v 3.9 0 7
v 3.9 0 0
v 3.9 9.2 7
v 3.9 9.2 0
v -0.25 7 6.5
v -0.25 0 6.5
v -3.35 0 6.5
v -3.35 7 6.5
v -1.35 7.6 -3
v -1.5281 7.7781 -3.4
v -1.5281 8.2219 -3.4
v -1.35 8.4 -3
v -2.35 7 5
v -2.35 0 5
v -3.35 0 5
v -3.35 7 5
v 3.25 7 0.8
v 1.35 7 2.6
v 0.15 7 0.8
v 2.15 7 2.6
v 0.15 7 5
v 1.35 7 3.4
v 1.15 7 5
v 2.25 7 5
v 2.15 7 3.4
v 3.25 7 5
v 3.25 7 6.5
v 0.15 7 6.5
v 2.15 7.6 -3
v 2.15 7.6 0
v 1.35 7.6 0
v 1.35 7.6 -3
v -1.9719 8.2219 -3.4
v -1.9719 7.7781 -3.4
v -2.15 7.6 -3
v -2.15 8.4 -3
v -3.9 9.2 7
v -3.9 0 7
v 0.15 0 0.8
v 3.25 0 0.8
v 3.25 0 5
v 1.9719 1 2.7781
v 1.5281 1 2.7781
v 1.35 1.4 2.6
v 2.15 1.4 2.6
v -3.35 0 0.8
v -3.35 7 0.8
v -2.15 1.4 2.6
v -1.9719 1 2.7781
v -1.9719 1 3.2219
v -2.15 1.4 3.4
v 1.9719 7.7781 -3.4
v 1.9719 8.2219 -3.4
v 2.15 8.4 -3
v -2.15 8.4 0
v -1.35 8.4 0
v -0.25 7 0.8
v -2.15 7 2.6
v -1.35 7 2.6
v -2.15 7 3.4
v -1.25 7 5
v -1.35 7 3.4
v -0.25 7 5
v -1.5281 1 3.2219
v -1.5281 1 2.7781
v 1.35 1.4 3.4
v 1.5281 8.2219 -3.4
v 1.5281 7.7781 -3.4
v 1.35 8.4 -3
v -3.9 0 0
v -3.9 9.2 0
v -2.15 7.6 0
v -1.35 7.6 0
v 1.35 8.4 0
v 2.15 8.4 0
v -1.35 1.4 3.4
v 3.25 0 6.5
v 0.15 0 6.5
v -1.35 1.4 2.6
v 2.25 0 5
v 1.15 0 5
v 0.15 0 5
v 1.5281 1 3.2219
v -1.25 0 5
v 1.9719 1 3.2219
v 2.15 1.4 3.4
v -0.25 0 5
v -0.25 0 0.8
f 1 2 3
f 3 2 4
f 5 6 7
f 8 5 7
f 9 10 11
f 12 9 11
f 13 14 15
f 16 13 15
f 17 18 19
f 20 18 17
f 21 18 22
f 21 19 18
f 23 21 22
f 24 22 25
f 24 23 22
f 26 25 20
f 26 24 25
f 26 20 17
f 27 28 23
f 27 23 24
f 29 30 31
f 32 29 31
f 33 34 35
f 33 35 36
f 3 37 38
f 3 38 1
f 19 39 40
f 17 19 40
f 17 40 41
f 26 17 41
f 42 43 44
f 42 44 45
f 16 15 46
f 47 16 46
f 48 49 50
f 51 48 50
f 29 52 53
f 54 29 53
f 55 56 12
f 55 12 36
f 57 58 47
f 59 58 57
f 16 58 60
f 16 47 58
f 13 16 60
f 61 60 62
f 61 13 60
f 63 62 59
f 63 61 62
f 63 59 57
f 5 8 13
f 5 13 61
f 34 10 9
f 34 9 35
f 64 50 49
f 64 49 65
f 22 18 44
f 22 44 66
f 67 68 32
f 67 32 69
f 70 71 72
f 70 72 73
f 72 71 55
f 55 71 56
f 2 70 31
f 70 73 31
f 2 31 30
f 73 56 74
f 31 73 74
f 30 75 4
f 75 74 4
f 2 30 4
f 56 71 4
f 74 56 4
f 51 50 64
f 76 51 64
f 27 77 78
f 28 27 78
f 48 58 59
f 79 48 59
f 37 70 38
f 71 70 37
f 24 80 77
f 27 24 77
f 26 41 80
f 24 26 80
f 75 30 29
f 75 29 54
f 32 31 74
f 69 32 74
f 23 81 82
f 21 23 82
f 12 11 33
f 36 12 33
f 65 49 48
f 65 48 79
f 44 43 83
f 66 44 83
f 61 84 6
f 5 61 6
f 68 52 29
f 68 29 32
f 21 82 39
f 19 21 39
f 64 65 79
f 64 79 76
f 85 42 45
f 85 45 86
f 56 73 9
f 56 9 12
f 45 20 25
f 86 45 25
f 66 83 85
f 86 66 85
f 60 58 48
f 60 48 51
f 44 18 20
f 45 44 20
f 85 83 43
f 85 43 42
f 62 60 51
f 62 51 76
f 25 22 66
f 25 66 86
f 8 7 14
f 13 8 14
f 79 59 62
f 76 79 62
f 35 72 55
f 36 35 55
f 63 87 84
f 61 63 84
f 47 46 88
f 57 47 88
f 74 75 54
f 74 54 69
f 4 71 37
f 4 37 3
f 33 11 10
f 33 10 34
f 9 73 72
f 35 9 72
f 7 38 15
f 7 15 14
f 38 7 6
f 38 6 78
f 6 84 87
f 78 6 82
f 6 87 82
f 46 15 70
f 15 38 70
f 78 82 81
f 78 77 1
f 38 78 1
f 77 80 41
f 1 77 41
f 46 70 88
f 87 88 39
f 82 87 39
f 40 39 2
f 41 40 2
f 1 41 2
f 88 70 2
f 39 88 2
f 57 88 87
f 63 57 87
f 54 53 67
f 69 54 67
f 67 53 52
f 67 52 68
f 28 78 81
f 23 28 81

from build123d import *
from OCP.BRepFilletAPI import BRepFilletAPI_MakeChamfer

# Parameters (mm, degrees)
SKETCH_1_W                          = 7.8
SKETCH_1_H                          = 9.2
EXTRUDE_1_DEPTH                     = 7
SKETCH_2_W                          = 0.8
SKETCH_2_H                          = 0.8
EXTRUDE_2_DEPTH                     = 3.4
CHAMFER_1_SIZE                      = 0.4
CHAMFER_1_SIZE2                     = 0.178091474
CUT_EXTRUDE_1_DEPTH                 = 7
PATTERN_LINEAR_1_COUNT              = 3
PATTERN_LINEAR_1_PITCH              = 3.5
CHAMFER_1_OF_PATTERN_LINEAR_1_SIZE  = 0.4
CHAMFER_1_OF_PATTERN_LINEAR_1_SIZE2 = 0.178091474
PATTERN_LINEAR_2_COUNT              = 2
PATTERN_LINEAR_2_PITCH              = 3.5
SKETCH_4_W                          = 0.8
SKETCH_4_H                          = 0.8
EXTRUDE_3_DEPTH                     = 6
CHAMFER_2_SIZE                      = 0.4
CHAMFER_2_SIZE2                     = 0.178091474
PATTERN_LINEAR_3_COUNT              = 2
PATTERN_LINEAR_3_PITCH              = 3.5
CHAMFER_2_OF_PATTERN_LINEAR_3_SIZE  = 0.4
CHAMFER_2_OF_PATTERN_LINEAR_3_SIZE2 = 0.178091474


with BuildPart() as part:
    # Эскиз1 → Бобышка-Вытянуть1 (new body)
    with BuildSketch(Plane.XY):
        with Locations((0, 4.6)):
            Rectangle(SKETCH_1_W, SKETCH_1_H)
    extrude(amount=EXTRUDE_1_DEPTH)

    # Эскиз2 → Бобышка-Вытянуть2 (add)
    with BuildSketch(Plane(origin=(0, 0, 0), x_dir=(-1, 0, 0), z_dir=(0, 0, -1))):
        with Locations((-1.75, 8)):
            Rectangle(SKETCH_2_W, SKETCH_2_H)
    extrude_2 = extrude(amount=EXTRUDE_2_DEPTH)

    # Фаска1: one chamfer whose edges measure the first distance from different faces: ONE call of the kernel's chamfer builder (chamfer() names one face for all edges)
    chamfer_1_edges_1 = [part.edges().sort_by_distance(p)[0] for p in [
        (1.35, 8, -3.4),
    ]]
    chamfer_1_side_1 = [part.faces().sort_by_distance(p)[0] for p in [
        (1.35, 8, -1.7),
    ]]
    chamfer_1_edges_2 = [part.edges().sort_by_distance(p)[0] for p in [
        (1.75, 8.4, -3.4),
    ]]
    chamfer_1_side_2 = [part.faces().sort_by_distance(p)[0] for p in [
        (1.75, 8.4, -1.7),
    ]]
    chamfer_1_edges_3 = [part.edges().sort_by_distance(p)[0] for p in [
        (2.15, 8, -3.4),
    ]]
    chamfer_1_side_3 = [part.faces().sort_by_distance(p)[0] for p in [
        (2.15, 8, -1.7),
    ]]
    chamfer_1_edges_4 = [part.edges().sort_by_distance(p)[0] for p in [
        (1.75, 7.6, -3.4),
    ]]
    chamfer_1_side_4 = [part.faces().sort_by_distance(p)[0] for p in [
        (1.75, 7.6, -1.7),
    ]]
    chamfer_1 = BRepFilletAPI_MakeChamfer(part.part.solid().wrapped)
    for e in chamfer_1_edges_1:
        chamfer_1.Add(CHAMFER_1_SIZE, CHAMFER_1_SIZE2, e.wrapped, chamfer_1_side_1[0].wrapped)  # the first distance lies on this face
    for e in chamfer_1_edges_2:
        chamfer_1.Add(CHAMFER_1_SIZE, CHAMFER_1_SIZE2, e.wrapped, chamfer_1_side_2[0].wrapped)  # the first distance lies on this face
    for e in chamfer_1_edges_3:
        chamfer_1.Add(CHAMFER_1_SIZE, CHAMFER_1_SIZE2, e.wrapped, chamfer_1_side_3[0].wrapped)  # the first distance lies on this face
    for e in chamfer_1_edges_4:
        chamfer_1.Add(CHAMFER_1_SIZE, CHAMFER_1_SIZE2, e.wrapped, chamfer_1_side_4[0].wrapped)  # the first distance lies on this face
    add(Compound.cast(chamfer_1.Shape()), mode=Mode.REPLACE)

    # Эскиз3 → Вырез-Вытянуть1 (cut)
    with BuildSketch(Plane.XZ):
        Polygon((0.15, 0.8), (3.25, 0.8), (3.25, 5), (2.25, 5), (3.25, 6.5), (0.15, 6.5), (1.15, 5), (0.15, 5), align=None)
    cut_extrude_1 = extrude(amount=-CUT_EXTRUDE_1_DEPTH, mode=Mode.SUBTRACT)

    # Линейный массив1: Бобышка-Вытянуть2 ×3, 1 skipped
    with Locations(*[(-i * PATTERN_LINEAR_1_PITCH, 0, 0) for i in range(1, PATTERN_LINEAR_1_COUNT) if i not in (2,)]):
        add(extrude_2)

    # Фаска1 of Линейный массив1: one chamfer whose edges measure the first distance from different faces: ONE call of the kernel's chamfer builder (chamfer() names one face for all edges)
    chamfer_1_of_pattern_linear_1_edges_1 = [part.edges().sort_by_distance(p)[0] for p in [
        (-2.15, 8, -3.4),
    ]]
    chamfer_1_of_pattern_linear_1_side_1 = [part.faces().sort_by_distance(p)[0] for p in [
        (-2.15, 8, -1.7),
    ]]
    chamfer_1_of_pattern_linear_1_edges_2 = [part.edges().sort_by_distance(p)[0] for p in [
        (-1.75, 8.4, -3.4),
    ]]
    chamfer_1_of_pattern_linear_1_side_2 = [part.faces().sort_by_distance(p)[0] for p in [
        (-1.75, 8.4, -1.7),
    ]]
    chamfer_1_of_pattern_linear_1_edges_3 = [part.edges().sort_by_distance(p)[0] for p in [
        (-1.35, 8, -3.4),
    ]]
    chamfer_1_of_pattern_linear_1_side_3 = [part.faces().sort_by_distance(p)[0] for p in [
        (-1.35, 8, -1.7),
    ]]
    chamfer_1_of_pattern_linear_1_edges_4 = [part.edges().sort_by_distance(p)[0] for p in [
        (-1.75, 7.6, -3.4),
    ]]
    chamfer_1_of_pattern_linear_1_side_4 = [part.faces().sort_by_distance(p)[0] for p in [
        (-1.75, 7.6, -1.7),
    ]]
    chamfer_1_of_pattern_linear_1 = BRepFilletAPI_MakeChamfer(part.part.solid().wrapped)
    for e in chamfer_1_of_pattern_linear_1_edges_1:
        chamfer_1_of_pattern_linear_1.Add(CHAMFER_1_OF_PATTERN_LINEAR_1_SIZE, CHAMFER_1_OF_PATTERN_LINEAR_1_SIZE2, e.wrapped, chamfer_1_of_pattern_linear_1_side_1[0].wrapped)  # the first distance lies on this face
    for e in chamfer_1_of_pattern_linear_1_edges_2:
        chamfer_1_of_pattern_linear_1.Add(CHAMFER_1_OF_PATTERN_LINEAR_1_SIZE, CHAMFER_1_OF_PATTERN_LINEAR_1_SIZE2, e.wrapped, chamfer_1_of_pattern_linear_1_side_2[0].wrapped)  # the first distance lies on this face
    for e in chamfer_1_of_pattern_linear_1_edges_3:
        chamfer_1_of_pattern_linear_1.Add(CHAMFER_1_OF_PATTERN_LINEAR_1_SIZE, CHAMFER_1_OF_PATTERN_LINEAR_1_SIZE2, e.wrapped, chamfer_1_of_pattern_linear_1_side_3[0].wrapped)  # the first distance lies on this face
    for e in chamfer_1_of_pattern_linear_1_edges_4:
        chamfer_1_of_pattern_linear_1.Add(CHAMFER_1_OF_PATTERN_LINEAR_1_SIZE, CHAMFER_1_OF_PATTERN_LINEAR_1_SIZE2, e.wrapped, chamfer_1_of_pattern_linear_1_side_4[0].wrapped)  # the first distance lies on this face
    add(Compound.cast(chamfer_1_of_pattern_linear_1.Shape()), mode=Mode.REPLACE)

    # Линейный массив2: Вырез-Вытянуть1 ×2
    with Locations(*[(-i * PATTERN_LINEAR_2_PITCH, 0, 0) for i in range(1, PATTERN_LINEAR_2_COUNT)]):
        add(cut_extrude_1, mode=Mode.SUBTRACT)

    # Эскиз4 → Бобышка-Вытянуть3 (add)
    with BuildSketch(Plane.XZ.offset(-7)):
        with Locations((1.75, 3)):
            Rectangle(SKETCH_4_W, SKETCH_4_H)
    extrude_3 = extrude(amount=EXTRUDE_3_DEPTH)

    # Фаска2: one chamfer whose edges measure the first distance from different faces: ONE call of the kernel's chamfer builder (chamfer() names one face for all edges)
    chamfer_2_edges_1 = [part.edges().sort_by_distance(p)[0] for p in [
        (2.15, 1, 3),
    ]]
    chamfer_2_side_1 = [part.faces().sort_by_distance(p)[0] for p in [
        (2.15, 4, 3),
    ]]
    chamfer_2_edges_2 = [part.edges().sort_by_distance(p)[0] for p in [
        (1.75, 1, 3.4),
    ]]
    chamfer_2_side_2 = [part.faces().sort_by_distance(p)[0] for p in [
        (1.75, 4, 3.4),
    ]]
    chamfer_2_edges_3 = [part.edges().sort_by_distance(p)[0] for p in [
        (1.35, 1, 3),
    ]]
    chamfer_2_side_3 = [part.faces().sort_by_distance(p)[0] for p in [
        (1.35, 4, 3),
    ]]
    chamfer_2_edges_4 = [part.edges().sort_by_distance(p)[0] for p in [
        (1.75, 1, 2.6),
    ]]
    chamfer_2_side_4 = [part.faces().sort_by_distance(p)[0] for p in [
        (1.75, 4, 2.6),
    ]]
    chamfer_2 = BRepFilletAPI_MakeChamfer(part.part.solid().wrapped)
    for e in chamfer_2_edges_1:
        chamfer_2.Add(CHAMFER_2_SIZE, CHAMFER_2_SIZE2, e.wrapped, chamfer_2_side_1[0].wrapped)  # the first distance lies on this face
    for e in chamfer_2_edges_2:
        chamfer_2.Add(CHAMFER_2_SIZE, CHAMFER_2_SIZE2, e.wrapped, chamfer_2_side_2[0].wrapped)  # the first distance lies on this face
    for e in chamfer_2_edges_3:
        chamfer_2.Add(CHAMFER_2_SIZE, CHAMFER_2_SIZE2, e.wrapped, chamfer_2_side_3[0].wrapped)  # the first distance lies on this face
    for e in chamfer_2_edges_4:
        chamfer_2.Add(CHAMFER_2_SIZE, CHAMFER_2_SIZE2, e.wrapped, chamfer_2_side_4[0].wrapped)  # the first distance lies on this face
    add(Compound.cast(chamfer_2.Shape()), mode=Mode.REPLACE)

    # Линейный массив3: Бобышка-Вытянуть3 ×2
    with Locations(*[(-i * PATTERN_LINEAR_3_PITCH, 0, 0) for i in range(1, PATTERN_LINEAR_3_COUNT)]):
        add(extrude_3)

    # Фаска2 of Линейный массив3: one chamfer whose edges measure the first distance from different faces: ONE call of the kernel's chamfer builder (chamfer() names one face for all edges)
    chamfer_2_of_pattern_linear_3_edges_1 = [part.edges().sort_by_distance(p)[0] for p in [
        (-1.35, 1, 3),
    ]]
    chamfer_2_of_pattern_linear_3_side_1 = [part.faces().sort_by_distance(p)[0] for p in [
        (-1.35, 4, 3),
    ]]
    chamfer_2_of_pattern_linear_3_edges_2 = [part.edges().sort_by_distance(p)[0] for p in [
        (-1.75, 1, 3.4),
    ]]
    chamfer_2_of_pattern_linear_3_side_2 = [part.faces().sort_by_distance(p)[0] for p in [
        (-1.75, 4, 3.4),
    ]]
    chamfer_2_of_pattern_linear_3_edges_3 = [part.edges().sort_by_distance(p)[0] for p in [
        (-2.15, 1, 3),
    ]]
    chamfer_2_of_pattern_linear_3_side_3 = [part.faces().sort_by_distance(p)[0] for p in [
        (-2.15, 4, 3),
    ]]
    chamfer_2_of_pattern_linear_3_edges_4 = [part.edges().sort_by_distance(p)[0] for p in [
        (-1.75, 1, 2.6),
    ]]
    chamfer_2_of_pattern_linear_3_side_4 = [part.faces().sort_by_distance(p)[0] for p in [
        (-1.75, 4, 2.6),
    ]]
    chamfer_2_of_pattern_linear_3 = BRepFilletAPI_MakeChamfer(part.part.solid().wrapped)
    for e in chamfer_2_of_pattern_linear_3_edges_1:
        chamfer_2_of_pattern_linear_3.Add(CHAMFER_2_OF_PATTERN_LINEAR_3_SIZE, CHAMFER_2_OF_PATTERN_LINEAR_3_SIZE2, e.wrapped, chamfer_2_of_pattern_linear_3_side_1[0].wrapped)  # the first distance lies on this face
    for e in chamfer_2_of_pattern_linear_3_edges_2:
        chamfer_2_of_pattern_linear_3.Add(CHAMFER_2_OF_PATTERN_LINEAR_3_SIZE, CHAMFER_2_OF_PATTERN_LINEAR_3_SIZE2, e.wrapped, chamfer_2_of_pattern_linear_3_side_2[0].wrapped)  # the first distance lies on this face
    for e in chamfer_2_of_pattern_linear_3_edges_3:
        chamfer_2_of_pattern_linear_3.Add(CHAMFER_2_OF_PATTERN_LINEAR_3_SIZE, CHAMFER_2_OF_PATTERN_LINEAR_3_SIZE2, e.wrapped, chamfer_2_of_pattern_linear_3_side_3[0].wrapped)  # the first distance lies on this face
    for e in chamfer_2_of_pattern_linear_3_edges_4:
        chamfer_2_of_pattern_linear_3.Add(CHAMFER_2_OF_PATTERN_LINEAR_3_SIZE, CHAMFER_2_OF_PATTERN_LINEAR_3_SIZE2, e.wrapped, chamfer_2_of_pattern_linear_3_side_4[0].wrapped)  # the first distance lies on this face
    add(Compound.cast(chamfer_2_of_pattern_linear_3.Shape()), mode=Mode.REPLACE)


solid = part.part
